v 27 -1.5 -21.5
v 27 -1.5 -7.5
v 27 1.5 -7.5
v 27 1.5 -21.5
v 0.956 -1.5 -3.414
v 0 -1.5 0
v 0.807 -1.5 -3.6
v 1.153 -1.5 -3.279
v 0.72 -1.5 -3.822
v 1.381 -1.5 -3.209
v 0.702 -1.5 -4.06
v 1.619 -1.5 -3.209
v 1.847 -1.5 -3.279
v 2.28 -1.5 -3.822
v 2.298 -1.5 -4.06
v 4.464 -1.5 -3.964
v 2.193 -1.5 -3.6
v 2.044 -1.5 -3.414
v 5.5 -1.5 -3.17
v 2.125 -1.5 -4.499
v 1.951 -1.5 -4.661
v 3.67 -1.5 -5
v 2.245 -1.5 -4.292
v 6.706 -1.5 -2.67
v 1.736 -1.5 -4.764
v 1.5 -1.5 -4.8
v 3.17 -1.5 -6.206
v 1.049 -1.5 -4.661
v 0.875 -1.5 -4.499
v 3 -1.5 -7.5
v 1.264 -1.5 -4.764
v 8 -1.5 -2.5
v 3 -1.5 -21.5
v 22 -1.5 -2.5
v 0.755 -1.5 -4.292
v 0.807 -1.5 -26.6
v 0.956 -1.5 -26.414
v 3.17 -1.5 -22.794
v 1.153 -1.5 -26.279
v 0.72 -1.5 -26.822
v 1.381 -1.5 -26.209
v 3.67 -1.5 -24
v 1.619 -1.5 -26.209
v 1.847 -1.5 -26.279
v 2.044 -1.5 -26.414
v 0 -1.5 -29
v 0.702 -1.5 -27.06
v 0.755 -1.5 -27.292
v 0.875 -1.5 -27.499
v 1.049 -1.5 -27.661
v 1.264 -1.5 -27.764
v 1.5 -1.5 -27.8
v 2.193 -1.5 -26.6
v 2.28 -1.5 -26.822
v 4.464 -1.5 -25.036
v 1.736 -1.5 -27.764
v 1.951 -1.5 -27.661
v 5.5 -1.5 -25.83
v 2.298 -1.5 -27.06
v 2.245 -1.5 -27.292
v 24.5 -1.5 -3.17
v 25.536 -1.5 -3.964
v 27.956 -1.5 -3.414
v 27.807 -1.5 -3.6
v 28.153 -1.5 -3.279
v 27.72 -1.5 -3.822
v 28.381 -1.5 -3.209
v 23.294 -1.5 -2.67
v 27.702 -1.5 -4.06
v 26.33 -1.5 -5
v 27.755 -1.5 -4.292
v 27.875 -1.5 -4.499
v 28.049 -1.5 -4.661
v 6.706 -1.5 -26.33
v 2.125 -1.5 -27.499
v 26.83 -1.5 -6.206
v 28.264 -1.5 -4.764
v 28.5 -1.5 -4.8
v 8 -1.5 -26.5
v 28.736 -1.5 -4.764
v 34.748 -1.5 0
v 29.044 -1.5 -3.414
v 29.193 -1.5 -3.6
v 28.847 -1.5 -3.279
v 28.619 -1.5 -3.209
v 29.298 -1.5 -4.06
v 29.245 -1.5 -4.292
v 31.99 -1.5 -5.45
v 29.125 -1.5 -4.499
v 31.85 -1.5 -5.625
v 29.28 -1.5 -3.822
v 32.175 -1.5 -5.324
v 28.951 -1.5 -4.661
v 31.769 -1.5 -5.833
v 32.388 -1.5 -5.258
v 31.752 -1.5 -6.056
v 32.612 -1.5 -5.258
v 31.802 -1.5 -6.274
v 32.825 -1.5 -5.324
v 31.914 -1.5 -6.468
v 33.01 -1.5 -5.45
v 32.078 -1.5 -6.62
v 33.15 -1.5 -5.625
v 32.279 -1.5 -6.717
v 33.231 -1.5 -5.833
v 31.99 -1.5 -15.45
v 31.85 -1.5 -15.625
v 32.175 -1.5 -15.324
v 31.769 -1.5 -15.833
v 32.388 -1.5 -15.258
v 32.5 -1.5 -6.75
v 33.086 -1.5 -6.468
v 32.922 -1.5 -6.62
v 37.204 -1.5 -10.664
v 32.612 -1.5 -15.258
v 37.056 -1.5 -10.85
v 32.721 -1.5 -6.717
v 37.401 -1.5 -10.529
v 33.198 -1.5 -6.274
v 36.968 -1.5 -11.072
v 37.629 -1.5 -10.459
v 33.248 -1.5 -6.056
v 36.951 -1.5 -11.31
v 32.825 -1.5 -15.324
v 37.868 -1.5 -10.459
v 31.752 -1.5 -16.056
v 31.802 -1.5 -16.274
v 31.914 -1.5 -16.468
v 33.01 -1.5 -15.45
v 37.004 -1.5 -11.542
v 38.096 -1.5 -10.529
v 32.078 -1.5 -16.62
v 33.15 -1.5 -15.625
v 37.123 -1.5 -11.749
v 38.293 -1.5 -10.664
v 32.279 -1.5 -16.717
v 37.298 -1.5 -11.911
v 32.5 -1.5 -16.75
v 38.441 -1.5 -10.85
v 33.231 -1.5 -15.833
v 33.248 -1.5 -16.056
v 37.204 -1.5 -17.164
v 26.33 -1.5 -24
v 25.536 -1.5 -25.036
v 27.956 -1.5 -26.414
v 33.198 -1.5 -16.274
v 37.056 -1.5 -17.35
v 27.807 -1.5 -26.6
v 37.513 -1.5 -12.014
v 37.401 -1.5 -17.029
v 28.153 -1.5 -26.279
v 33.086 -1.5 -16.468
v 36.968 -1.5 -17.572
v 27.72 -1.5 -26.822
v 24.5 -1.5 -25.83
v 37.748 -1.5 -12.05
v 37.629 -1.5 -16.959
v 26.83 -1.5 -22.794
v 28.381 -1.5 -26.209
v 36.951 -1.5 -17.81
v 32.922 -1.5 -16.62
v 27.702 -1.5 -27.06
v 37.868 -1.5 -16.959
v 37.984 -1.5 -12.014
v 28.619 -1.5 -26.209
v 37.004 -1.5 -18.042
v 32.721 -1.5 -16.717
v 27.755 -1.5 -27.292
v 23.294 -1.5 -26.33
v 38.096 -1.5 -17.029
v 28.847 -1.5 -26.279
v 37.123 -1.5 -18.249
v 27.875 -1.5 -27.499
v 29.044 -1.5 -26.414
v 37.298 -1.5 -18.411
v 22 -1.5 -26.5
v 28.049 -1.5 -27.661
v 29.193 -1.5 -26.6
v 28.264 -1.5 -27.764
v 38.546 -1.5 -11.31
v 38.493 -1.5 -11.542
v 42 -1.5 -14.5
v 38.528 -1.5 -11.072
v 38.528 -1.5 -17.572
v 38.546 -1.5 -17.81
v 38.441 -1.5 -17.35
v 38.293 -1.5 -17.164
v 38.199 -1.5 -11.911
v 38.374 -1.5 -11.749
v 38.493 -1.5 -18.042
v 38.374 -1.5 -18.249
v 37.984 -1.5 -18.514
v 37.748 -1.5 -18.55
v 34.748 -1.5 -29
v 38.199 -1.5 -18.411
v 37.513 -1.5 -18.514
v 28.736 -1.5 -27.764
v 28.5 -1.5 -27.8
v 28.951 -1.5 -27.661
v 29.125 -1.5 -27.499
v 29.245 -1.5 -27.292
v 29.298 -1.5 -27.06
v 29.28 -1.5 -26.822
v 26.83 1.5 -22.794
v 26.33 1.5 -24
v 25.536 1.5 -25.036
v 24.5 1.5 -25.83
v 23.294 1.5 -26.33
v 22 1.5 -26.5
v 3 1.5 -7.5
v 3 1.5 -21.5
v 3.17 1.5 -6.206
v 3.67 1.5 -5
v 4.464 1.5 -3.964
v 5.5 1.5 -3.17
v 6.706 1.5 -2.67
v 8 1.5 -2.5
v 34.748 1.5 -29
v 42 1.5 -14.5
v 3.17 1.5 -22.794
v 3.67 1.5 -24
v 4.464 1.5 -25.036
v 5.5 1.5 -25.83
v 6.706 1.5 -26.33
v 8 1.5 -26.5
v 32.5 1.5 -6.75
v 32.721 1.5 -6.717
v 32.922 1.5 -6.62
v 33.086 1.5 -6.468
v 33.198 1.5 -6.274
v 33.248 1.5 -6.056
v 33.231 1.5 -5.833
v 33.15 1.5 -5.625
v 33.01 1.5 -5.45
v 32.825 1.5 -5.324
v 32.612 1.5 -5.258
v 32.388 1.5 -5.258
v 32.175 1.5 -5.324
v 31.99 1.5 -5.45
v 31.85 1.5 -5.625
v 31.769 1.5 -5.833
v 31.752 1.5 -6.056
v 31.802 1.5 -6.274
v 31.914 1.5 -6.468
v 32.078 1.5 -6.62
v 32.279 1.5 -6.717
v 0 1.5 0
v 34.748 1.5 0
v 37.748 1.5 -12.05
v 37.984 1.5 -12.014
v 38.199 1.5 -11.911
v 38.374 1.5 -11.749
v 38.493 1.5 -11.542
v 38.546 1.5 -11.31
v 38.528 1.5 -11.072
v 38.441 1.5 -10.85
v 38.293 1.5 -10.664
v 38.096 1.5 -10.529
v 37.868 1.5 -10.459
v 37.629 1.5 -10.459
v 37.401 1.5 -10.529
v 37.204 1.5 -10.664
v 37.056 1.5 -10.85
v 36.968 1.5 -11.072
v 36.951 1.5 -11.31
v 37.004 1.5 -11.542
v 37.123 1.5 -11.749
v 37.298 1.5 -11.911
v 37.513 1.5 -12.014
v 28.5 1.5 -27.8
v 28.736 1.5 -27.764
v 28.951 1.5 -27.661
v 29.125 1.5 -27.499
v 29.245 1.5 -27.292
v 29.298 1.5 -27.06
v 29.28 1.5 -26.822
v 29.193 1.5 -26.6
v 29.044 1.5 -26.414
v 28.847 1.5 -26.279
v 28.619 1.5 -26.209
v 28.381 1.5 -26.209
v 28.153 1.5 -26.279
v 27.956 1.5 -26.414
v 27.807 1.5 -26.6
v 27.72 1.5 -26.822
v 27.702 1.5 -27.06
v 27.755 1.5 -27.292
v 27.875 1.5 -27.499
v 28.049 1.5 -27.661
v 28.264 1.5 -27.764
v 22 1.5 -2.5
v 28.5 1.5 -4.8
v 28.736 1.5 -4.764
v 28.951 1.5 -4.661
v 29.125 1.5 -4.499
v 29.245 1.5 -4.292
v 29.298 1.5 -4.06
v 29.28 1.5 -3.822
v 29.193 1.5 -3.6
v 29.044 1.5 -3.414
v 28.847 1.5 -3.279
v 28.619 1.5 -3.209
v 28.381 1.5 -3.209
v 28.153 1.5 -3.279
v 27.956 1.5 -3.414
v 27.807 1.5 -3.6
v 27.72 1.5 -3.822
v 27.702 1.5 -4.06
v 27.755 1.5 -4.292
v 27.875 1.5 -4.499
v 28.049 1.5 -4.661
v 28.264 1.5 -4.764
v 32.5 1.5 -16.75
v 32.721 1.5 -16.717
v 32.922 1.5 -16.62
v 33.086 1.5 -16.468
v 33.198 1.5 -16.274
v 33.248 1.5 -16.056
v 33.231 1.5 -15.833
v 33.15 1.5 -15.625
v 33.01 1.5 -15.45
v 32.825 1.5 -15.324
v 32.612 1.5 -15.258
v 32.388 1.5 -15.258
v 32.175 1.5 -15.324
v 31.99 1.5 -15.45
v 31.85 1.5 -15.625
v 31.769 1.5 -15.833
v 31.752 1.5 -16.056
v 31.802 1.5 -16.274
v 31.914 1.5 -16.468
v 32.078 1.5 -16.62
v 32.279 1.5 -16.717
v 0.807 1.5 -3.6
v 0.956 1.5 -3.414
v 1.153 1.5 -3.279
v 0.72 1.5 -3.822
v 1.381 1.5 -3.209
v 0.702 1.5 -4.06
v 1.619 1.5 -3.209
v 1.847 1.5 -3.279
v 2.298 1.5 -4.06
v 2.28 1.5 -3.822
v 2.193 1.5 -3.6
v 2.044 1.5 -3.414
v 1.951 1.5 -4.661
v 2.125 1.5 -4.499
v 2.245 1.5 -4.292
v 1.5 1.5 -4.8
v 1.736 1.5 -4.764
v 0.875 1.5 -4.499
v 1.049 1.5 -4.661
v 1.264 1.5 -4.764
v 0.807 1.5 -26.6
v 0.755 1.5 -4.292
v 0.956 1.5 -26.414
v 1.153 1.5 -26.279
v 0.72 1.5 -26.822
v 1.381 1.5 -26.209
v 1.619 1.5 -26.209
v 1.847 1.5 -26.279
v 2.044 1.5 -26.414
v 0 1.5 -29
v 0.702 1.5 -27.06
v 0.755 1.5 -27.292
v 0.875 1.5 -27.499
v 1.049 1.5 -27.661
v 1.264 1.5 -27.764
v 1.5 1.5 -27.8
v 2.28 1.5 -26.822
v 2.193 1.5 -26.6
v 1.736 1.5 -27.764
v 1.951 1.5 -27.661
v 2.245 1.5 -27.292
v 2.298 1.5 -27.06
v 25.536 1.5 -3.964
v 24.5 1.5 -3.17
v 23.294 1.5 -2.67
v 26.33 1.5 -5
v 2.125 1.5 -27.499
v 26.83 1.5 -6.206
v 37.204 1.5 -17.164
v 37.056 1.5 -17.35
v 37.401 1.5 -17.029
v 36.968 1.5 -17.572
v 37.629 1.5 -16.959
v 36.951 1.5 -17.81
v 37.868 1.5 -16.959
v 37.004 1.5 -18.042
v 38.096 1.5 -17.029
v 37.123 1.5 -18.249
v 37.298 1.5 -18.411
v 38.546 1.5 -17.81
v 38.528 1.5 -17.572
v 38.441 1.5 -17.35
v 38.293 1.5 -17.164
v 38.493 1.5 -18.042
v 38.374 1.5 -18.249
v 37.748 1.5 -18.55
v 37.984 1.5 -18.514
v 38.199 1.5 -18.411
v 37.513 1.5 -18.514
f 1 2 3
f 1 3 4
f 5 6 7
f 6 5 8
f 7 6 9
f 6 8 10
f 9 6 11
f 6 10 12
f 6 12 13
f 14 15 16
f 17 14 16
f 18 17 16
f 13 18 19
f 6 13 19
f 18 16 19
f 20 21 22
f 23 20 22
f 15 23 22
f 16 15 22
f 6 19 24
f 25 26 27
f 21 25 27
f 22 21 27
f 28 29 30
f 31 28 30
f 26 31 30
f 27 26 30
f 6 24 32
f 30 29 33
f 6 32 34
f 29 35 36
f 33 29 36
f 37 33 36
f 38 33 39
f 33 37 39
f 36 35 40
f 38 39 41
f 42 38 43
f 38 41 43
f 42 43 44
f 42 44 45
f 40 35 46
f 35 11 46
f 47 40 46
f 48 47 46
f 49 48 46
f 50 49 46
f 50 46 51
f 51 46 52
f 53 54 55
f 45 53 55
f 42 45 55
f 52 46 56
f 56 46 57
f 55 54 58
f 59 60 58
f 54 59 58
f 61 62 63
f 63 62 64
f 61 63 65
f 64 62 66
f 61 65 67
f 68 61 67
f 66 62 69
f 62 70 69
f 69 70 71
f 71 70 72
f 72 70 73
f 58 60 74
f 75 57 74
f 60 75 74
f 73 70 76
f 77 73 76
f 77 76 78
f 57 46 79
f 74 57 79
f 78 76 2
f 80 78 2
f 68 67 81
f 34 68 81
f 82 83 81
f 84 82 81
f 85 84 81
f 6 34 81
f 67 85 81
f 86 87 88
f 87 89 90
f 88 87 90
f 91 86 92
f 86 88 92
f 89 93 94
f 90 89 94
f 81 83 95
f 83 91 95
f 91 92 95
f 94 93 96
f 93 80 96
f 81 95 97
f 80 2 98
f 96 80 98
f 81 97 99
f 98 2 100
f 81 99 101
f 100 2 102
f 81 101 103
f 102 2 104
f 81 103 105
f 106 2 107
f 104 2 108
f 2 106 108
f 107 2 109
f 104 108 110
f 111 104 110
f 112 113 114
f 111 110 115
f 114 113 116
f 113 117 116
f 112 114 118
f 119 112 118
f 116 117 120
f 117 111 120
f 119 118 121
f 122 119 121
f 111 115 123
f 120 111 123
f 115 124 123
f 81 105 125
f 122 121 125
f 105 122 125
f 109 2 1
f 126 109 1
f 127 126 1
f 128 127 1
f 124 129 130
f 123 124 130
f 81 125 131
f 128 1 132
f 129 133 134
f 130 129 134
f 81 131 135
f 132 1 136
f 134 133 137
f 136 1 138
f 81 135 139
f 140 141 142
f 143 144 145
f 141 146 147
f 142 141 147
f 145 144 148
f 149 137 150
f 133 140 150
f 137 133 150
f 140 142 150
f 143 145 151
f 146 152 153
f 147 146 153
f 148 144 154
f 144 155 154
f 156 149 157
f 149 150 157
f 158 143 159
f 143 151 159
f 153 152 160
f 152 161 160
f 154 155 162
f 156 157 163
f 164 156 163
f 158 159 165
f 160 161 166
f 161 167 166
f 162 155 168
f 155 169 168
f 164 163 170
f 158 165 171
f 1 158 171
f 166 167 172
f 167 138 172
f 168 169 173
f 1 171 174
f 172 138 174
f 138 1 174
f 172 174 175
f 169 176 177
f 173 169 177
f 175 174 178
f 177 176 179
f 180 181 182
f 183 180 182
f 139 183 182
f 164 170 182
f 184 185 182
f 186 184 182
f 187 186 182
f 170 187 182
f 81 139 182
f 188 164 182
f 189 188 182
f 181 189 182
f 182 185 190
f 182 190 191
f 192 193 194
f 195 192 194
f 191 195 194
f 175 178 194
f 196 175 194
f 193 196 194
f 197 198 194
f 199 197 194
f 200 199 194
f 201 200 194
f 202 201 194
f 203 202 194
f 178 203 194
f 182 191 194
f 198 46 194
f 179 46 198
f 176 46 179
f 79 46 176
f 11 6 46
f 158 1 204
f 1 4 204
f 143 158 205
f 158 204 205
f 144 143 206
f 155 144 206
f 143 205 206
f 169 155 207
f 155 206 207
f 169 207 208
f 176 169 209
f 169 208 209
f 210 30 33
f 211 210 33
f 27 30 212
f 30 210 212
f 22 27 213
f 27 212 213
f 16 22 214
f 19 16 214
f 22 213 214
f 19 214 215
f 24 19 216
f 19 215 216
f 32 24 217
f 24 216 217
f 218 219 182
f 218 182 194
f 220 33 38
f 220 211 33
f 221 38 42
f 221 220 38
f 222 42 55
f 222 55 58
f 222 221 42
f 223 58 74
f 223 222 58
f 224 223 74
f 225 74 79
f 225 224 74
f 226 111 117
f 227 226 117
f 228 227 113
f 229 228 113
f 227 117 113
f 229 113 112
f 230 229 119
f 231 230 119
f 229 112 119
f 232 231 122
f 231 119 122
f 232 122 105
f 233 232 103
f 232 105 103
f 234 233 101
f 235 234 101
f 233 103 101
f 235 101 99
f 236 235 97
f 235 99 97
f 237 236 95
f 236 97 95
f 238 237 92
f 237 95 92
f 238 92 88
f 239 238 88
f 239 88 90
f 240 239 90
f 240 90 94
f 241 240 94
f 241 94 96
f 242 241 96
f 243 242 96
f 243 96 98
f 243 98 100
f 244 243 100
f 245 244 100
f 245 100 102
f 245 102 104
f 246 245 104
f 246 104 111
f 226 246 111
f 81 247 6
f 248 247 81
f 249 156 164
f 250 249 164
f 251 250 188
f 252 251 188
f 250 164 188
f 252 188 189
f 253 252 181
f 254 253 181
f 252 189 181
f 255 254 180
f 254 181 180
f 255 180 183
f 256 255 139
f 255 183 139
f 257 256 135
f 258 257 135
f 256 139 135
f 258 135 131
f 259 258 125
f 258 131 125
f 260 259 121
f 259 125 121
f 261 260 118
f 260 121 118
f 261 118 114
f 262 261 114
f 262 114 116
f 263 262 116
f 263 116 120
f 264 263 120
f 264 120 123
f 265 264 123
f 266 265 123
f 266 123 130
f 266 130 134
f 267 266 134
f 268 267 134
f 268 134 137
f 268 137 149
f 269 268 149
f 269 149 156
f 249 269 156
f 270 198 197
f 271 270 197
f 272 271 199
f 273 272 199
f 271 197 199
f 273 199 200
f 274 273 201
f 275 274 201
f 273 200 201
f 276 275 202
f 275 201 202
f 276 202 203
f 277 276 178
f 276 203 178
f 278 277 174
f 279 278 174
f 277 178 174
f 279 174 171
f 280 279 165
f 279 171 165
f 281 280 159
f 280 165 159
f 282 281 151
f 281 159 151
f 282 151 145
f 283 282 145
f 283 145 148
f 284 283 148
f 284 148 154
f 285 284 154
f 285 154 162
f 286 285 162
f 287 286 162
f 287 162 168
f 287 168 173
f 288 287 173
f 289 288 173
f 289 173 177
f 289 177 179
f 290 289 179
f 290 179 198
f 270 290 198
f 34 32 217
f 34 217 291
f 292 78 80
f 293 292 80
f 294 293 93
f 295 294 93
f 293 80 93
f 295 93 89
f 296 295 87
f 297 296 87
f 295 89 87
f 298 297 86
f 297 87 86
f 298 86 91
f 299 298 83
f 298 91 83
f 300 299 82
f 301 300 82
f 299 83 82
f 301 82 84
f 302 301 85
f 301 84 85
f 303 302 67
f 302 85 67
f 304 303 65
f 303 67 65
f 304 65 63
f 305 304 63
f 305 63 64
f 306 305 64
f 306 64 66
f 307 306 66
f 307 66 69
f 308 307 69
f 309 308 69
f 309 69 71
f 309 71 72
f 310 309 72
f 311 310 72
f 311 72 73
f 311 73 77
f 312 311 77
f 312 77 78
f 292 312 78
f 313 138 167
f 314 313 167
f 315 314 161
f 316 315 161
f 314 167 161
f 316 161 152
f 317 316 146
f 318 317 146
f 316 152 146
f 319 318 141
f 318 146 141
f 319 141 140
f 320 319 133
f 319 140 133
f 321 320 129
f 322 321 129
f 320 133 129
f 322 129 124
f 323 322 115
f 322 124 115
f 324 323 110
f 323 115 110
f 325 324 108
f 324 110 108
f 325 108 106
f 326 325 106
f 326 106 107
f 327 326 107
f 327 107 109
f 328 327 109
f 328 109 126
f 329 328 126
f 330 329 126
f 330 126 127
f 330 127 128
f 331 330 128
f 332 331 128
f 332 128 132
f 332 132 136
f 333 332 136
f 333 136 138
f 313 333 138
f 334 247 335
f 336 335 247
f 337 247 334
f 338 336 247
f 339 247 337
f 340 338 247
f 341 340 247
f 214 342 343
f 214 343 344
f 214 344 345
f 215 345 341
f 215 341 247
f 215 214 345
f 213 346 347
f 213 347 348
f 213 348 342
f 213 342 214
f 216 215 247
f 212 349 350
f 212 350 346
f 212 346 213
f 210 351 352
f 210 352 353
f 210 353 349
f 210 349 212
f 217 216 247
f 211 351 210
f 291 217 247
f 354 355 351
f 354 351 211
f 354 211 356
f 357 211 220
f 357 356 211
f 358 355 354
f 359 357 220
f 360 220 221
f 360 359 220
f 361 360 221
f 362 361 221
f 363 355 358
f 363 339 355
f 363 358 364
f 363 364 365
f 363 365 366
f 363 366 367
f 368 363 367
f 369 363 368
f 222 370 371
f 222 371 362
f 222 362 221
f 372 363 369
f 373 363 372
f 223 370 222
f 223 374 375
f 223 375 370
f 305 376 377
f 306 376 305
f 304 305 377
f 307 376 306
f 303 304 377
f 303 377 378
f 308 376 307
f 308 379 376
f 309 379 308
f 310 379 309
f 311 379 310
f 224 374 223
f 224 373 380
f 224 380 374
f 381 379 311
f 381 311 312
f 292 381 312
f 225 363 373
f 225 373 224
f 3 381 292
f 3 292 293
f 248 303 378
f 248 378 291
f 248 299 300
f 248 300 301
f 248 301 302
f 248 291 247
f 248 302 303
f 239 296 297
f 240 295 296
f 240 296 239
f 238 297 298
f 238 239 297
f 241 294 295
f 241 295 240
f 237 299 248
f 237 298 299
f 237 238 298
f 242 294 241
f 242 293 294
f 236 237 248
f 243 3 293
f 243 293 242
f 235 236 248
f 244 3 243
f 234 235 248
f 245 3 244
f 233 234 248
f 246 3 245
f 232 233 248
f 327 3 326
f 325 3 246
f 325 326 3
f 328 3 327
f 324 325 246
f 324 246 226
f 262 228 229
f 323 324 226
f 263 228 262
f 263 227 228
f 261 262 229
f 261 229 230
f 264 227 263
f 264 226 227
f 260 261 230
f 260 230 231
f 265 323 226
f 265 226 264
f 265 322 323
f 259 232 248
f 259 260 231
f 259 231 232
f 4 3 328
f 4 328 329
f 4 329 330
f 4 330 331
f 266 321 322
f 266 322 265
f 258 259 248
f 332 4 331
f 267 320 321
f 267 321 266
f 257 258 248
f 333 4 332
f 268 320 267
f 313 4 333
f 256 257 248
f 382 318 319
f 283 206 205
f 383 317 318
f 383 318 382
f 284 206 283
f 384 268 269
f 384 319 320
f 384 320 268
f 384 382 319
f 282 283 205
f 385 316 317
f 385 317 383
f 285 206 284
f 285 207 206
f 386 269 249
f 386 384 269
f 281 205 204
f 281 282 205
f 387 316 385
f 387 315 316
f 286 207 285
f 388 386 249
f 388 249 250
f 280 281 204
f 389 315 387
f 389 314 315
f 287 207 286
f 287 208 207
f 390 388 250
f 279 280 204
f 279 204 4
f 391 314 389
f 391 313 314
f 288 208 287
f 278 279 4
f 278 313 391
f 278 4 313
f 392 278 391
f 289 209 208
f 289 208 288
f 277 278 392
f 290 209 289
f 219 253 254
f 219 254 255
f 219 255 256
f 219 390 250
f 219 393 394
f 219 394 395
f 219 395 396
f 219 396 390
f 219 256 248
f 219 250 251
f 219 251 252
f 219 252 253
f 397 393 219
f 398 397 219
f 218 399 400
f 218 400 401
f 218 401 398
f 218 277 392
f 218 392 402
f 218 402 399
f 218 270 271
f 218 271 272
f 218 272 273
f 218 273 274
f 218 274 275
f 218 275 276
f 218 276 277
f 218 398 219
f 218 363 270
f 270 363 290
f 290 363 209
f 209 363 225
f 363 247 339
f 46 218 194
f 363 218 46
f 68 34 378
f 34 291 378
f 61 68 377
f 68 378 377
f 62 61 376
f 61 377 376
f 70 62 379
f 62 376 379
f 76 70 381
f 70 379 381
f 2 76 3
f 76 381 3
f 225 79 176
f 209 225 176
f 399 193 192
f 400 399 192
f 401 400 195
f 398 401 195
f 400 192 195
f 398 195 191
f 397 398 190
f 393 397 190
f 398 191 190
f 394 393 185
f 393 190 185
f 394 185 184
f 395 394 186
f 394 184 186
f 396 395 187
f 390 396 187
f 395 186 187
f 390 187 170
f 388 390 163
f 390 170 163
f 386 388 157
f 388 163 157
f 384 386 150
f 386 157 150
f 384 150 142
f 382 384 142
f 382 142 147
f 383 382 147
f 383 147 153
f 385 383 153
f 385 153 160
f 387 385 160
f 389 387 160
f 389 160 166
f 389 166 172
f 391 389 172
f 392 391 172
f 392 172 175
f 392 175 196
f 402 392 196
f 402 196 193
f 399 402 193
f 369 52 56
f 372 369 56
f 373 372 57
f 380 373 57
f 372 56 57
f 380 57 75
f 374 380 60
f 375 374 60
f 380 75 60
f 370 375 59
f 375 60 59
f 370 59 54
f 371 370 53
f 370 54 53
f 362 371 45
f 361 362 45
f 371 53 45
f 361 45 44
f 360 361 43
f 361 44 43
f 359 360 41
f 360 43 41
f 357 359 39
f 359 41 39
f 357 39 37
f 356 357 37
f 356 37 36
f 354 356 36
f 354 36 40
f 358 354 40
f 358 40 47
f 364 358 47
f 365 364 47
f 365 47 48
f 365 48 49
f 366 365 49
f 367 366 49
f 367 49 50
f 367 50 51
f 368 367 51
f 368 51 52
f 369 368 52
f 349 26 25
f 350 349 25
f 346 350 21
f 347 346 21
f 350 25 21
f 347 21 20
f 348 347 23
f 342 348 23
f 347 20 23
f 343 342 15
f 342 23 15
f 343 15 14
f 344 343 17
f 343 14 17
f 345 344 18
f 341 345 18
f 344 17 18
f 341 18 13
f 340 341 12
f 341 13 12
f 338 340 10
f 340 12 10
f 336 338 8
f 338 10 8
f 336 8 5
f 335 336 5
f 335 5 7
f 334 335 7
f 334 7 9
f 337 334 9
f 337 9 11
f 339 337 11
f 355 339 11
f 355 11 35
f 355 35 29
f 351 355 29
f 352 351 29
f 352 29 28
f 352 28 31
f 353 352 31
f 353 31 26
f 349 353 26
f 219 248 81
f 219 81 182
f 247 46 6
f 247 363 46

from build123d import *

# Parameters (mm, degrees)
BOSS_EXTRUDE1_DEPTH     = 1.5
CUT_EXTRUDE1_DEPTH      = 52.061237744
CUT_EXTRUDE1_DEPTH_BACK = 52.061237744
SKETCH2_W               = 24
SKETCH2_H               = 24
FILLET1_R               = 5
M2X0_4_TAPPED_HOLE1_D   = 1.6
F_1_5MM_DOWEL_HOLE1_D   = 1.5


with BuildPart() as part:
    # Sketch1 → Boss-Extrude1 (new, symmetric)
    with BuildSketch(Plane(origin=(0, 0, 0), x_dir=(1, 0, 0), z_dir=(0, 1, 0))):
        Polygon((0, 0), (34.748434417, 0), (42, 14.5), (34.748434417, 29), (0, 29), align=None)
    extrude(amount=BOSS_EXTRUDE1_DEPTH, both=True)

    # Sketch2 → Cut-Extrude1 (cut, two sides: drawn at the far end of the back side and taken through both)
    with BuildSketch(Plane(origin=(0, 0, 0), x_dir=(1, 0, 0), z_dir=(0, 1, 0)).offset(-CUT_EXTRUDE1_DEPTH_BACK)):
        with Locations((15, 14.5)):
            Rectangle(SKETCH2_W, SKETCH2_H)
    extrude(amount=CUT_EXTRUDE1_DEPTH + CUT_EXTRUDE1_DEPTH_BACK, mode=Mode.SUBTRACT)

    # Fillet1
    fillet1_edges = [part.edges().sort_by_distance(p)[0] for p in [
        (3, 0, -2.5),
        (3, 0, -26.5),
        (27, 0, -26.5),
        (27, 0, -2.5),
    ]]
    fillet(fillet1_edges, radius=FILLET1_R)

    # M2x0.4 Tapped Hole1 (through all)
    with Locations(Plane(origin=(1.5, 1.5, -27), x_dir=(0, 0, 1), z_dir=(0, 1, 0))):
        with Locations((0, 0), (0, 27), (9.25, 36.248434417), (15.75, 36.248434417), (23, 27), (23, 0)):
            Hole(M2X0_4_TAPPED_HOLE1_D / 2)

    # Ø1.5mm Dowel Hole1 (through all)
    with Locations(Plane(origin=(32.5, 1.5, -16), x_dir=(0, 0, 1), z_dir=(0, 1, 0))):
        with Locations((0, 0), (10, 0)):
            Hole(F_1_5MM_DOWEL_HOLE1_D / 2)


solid = part.part
